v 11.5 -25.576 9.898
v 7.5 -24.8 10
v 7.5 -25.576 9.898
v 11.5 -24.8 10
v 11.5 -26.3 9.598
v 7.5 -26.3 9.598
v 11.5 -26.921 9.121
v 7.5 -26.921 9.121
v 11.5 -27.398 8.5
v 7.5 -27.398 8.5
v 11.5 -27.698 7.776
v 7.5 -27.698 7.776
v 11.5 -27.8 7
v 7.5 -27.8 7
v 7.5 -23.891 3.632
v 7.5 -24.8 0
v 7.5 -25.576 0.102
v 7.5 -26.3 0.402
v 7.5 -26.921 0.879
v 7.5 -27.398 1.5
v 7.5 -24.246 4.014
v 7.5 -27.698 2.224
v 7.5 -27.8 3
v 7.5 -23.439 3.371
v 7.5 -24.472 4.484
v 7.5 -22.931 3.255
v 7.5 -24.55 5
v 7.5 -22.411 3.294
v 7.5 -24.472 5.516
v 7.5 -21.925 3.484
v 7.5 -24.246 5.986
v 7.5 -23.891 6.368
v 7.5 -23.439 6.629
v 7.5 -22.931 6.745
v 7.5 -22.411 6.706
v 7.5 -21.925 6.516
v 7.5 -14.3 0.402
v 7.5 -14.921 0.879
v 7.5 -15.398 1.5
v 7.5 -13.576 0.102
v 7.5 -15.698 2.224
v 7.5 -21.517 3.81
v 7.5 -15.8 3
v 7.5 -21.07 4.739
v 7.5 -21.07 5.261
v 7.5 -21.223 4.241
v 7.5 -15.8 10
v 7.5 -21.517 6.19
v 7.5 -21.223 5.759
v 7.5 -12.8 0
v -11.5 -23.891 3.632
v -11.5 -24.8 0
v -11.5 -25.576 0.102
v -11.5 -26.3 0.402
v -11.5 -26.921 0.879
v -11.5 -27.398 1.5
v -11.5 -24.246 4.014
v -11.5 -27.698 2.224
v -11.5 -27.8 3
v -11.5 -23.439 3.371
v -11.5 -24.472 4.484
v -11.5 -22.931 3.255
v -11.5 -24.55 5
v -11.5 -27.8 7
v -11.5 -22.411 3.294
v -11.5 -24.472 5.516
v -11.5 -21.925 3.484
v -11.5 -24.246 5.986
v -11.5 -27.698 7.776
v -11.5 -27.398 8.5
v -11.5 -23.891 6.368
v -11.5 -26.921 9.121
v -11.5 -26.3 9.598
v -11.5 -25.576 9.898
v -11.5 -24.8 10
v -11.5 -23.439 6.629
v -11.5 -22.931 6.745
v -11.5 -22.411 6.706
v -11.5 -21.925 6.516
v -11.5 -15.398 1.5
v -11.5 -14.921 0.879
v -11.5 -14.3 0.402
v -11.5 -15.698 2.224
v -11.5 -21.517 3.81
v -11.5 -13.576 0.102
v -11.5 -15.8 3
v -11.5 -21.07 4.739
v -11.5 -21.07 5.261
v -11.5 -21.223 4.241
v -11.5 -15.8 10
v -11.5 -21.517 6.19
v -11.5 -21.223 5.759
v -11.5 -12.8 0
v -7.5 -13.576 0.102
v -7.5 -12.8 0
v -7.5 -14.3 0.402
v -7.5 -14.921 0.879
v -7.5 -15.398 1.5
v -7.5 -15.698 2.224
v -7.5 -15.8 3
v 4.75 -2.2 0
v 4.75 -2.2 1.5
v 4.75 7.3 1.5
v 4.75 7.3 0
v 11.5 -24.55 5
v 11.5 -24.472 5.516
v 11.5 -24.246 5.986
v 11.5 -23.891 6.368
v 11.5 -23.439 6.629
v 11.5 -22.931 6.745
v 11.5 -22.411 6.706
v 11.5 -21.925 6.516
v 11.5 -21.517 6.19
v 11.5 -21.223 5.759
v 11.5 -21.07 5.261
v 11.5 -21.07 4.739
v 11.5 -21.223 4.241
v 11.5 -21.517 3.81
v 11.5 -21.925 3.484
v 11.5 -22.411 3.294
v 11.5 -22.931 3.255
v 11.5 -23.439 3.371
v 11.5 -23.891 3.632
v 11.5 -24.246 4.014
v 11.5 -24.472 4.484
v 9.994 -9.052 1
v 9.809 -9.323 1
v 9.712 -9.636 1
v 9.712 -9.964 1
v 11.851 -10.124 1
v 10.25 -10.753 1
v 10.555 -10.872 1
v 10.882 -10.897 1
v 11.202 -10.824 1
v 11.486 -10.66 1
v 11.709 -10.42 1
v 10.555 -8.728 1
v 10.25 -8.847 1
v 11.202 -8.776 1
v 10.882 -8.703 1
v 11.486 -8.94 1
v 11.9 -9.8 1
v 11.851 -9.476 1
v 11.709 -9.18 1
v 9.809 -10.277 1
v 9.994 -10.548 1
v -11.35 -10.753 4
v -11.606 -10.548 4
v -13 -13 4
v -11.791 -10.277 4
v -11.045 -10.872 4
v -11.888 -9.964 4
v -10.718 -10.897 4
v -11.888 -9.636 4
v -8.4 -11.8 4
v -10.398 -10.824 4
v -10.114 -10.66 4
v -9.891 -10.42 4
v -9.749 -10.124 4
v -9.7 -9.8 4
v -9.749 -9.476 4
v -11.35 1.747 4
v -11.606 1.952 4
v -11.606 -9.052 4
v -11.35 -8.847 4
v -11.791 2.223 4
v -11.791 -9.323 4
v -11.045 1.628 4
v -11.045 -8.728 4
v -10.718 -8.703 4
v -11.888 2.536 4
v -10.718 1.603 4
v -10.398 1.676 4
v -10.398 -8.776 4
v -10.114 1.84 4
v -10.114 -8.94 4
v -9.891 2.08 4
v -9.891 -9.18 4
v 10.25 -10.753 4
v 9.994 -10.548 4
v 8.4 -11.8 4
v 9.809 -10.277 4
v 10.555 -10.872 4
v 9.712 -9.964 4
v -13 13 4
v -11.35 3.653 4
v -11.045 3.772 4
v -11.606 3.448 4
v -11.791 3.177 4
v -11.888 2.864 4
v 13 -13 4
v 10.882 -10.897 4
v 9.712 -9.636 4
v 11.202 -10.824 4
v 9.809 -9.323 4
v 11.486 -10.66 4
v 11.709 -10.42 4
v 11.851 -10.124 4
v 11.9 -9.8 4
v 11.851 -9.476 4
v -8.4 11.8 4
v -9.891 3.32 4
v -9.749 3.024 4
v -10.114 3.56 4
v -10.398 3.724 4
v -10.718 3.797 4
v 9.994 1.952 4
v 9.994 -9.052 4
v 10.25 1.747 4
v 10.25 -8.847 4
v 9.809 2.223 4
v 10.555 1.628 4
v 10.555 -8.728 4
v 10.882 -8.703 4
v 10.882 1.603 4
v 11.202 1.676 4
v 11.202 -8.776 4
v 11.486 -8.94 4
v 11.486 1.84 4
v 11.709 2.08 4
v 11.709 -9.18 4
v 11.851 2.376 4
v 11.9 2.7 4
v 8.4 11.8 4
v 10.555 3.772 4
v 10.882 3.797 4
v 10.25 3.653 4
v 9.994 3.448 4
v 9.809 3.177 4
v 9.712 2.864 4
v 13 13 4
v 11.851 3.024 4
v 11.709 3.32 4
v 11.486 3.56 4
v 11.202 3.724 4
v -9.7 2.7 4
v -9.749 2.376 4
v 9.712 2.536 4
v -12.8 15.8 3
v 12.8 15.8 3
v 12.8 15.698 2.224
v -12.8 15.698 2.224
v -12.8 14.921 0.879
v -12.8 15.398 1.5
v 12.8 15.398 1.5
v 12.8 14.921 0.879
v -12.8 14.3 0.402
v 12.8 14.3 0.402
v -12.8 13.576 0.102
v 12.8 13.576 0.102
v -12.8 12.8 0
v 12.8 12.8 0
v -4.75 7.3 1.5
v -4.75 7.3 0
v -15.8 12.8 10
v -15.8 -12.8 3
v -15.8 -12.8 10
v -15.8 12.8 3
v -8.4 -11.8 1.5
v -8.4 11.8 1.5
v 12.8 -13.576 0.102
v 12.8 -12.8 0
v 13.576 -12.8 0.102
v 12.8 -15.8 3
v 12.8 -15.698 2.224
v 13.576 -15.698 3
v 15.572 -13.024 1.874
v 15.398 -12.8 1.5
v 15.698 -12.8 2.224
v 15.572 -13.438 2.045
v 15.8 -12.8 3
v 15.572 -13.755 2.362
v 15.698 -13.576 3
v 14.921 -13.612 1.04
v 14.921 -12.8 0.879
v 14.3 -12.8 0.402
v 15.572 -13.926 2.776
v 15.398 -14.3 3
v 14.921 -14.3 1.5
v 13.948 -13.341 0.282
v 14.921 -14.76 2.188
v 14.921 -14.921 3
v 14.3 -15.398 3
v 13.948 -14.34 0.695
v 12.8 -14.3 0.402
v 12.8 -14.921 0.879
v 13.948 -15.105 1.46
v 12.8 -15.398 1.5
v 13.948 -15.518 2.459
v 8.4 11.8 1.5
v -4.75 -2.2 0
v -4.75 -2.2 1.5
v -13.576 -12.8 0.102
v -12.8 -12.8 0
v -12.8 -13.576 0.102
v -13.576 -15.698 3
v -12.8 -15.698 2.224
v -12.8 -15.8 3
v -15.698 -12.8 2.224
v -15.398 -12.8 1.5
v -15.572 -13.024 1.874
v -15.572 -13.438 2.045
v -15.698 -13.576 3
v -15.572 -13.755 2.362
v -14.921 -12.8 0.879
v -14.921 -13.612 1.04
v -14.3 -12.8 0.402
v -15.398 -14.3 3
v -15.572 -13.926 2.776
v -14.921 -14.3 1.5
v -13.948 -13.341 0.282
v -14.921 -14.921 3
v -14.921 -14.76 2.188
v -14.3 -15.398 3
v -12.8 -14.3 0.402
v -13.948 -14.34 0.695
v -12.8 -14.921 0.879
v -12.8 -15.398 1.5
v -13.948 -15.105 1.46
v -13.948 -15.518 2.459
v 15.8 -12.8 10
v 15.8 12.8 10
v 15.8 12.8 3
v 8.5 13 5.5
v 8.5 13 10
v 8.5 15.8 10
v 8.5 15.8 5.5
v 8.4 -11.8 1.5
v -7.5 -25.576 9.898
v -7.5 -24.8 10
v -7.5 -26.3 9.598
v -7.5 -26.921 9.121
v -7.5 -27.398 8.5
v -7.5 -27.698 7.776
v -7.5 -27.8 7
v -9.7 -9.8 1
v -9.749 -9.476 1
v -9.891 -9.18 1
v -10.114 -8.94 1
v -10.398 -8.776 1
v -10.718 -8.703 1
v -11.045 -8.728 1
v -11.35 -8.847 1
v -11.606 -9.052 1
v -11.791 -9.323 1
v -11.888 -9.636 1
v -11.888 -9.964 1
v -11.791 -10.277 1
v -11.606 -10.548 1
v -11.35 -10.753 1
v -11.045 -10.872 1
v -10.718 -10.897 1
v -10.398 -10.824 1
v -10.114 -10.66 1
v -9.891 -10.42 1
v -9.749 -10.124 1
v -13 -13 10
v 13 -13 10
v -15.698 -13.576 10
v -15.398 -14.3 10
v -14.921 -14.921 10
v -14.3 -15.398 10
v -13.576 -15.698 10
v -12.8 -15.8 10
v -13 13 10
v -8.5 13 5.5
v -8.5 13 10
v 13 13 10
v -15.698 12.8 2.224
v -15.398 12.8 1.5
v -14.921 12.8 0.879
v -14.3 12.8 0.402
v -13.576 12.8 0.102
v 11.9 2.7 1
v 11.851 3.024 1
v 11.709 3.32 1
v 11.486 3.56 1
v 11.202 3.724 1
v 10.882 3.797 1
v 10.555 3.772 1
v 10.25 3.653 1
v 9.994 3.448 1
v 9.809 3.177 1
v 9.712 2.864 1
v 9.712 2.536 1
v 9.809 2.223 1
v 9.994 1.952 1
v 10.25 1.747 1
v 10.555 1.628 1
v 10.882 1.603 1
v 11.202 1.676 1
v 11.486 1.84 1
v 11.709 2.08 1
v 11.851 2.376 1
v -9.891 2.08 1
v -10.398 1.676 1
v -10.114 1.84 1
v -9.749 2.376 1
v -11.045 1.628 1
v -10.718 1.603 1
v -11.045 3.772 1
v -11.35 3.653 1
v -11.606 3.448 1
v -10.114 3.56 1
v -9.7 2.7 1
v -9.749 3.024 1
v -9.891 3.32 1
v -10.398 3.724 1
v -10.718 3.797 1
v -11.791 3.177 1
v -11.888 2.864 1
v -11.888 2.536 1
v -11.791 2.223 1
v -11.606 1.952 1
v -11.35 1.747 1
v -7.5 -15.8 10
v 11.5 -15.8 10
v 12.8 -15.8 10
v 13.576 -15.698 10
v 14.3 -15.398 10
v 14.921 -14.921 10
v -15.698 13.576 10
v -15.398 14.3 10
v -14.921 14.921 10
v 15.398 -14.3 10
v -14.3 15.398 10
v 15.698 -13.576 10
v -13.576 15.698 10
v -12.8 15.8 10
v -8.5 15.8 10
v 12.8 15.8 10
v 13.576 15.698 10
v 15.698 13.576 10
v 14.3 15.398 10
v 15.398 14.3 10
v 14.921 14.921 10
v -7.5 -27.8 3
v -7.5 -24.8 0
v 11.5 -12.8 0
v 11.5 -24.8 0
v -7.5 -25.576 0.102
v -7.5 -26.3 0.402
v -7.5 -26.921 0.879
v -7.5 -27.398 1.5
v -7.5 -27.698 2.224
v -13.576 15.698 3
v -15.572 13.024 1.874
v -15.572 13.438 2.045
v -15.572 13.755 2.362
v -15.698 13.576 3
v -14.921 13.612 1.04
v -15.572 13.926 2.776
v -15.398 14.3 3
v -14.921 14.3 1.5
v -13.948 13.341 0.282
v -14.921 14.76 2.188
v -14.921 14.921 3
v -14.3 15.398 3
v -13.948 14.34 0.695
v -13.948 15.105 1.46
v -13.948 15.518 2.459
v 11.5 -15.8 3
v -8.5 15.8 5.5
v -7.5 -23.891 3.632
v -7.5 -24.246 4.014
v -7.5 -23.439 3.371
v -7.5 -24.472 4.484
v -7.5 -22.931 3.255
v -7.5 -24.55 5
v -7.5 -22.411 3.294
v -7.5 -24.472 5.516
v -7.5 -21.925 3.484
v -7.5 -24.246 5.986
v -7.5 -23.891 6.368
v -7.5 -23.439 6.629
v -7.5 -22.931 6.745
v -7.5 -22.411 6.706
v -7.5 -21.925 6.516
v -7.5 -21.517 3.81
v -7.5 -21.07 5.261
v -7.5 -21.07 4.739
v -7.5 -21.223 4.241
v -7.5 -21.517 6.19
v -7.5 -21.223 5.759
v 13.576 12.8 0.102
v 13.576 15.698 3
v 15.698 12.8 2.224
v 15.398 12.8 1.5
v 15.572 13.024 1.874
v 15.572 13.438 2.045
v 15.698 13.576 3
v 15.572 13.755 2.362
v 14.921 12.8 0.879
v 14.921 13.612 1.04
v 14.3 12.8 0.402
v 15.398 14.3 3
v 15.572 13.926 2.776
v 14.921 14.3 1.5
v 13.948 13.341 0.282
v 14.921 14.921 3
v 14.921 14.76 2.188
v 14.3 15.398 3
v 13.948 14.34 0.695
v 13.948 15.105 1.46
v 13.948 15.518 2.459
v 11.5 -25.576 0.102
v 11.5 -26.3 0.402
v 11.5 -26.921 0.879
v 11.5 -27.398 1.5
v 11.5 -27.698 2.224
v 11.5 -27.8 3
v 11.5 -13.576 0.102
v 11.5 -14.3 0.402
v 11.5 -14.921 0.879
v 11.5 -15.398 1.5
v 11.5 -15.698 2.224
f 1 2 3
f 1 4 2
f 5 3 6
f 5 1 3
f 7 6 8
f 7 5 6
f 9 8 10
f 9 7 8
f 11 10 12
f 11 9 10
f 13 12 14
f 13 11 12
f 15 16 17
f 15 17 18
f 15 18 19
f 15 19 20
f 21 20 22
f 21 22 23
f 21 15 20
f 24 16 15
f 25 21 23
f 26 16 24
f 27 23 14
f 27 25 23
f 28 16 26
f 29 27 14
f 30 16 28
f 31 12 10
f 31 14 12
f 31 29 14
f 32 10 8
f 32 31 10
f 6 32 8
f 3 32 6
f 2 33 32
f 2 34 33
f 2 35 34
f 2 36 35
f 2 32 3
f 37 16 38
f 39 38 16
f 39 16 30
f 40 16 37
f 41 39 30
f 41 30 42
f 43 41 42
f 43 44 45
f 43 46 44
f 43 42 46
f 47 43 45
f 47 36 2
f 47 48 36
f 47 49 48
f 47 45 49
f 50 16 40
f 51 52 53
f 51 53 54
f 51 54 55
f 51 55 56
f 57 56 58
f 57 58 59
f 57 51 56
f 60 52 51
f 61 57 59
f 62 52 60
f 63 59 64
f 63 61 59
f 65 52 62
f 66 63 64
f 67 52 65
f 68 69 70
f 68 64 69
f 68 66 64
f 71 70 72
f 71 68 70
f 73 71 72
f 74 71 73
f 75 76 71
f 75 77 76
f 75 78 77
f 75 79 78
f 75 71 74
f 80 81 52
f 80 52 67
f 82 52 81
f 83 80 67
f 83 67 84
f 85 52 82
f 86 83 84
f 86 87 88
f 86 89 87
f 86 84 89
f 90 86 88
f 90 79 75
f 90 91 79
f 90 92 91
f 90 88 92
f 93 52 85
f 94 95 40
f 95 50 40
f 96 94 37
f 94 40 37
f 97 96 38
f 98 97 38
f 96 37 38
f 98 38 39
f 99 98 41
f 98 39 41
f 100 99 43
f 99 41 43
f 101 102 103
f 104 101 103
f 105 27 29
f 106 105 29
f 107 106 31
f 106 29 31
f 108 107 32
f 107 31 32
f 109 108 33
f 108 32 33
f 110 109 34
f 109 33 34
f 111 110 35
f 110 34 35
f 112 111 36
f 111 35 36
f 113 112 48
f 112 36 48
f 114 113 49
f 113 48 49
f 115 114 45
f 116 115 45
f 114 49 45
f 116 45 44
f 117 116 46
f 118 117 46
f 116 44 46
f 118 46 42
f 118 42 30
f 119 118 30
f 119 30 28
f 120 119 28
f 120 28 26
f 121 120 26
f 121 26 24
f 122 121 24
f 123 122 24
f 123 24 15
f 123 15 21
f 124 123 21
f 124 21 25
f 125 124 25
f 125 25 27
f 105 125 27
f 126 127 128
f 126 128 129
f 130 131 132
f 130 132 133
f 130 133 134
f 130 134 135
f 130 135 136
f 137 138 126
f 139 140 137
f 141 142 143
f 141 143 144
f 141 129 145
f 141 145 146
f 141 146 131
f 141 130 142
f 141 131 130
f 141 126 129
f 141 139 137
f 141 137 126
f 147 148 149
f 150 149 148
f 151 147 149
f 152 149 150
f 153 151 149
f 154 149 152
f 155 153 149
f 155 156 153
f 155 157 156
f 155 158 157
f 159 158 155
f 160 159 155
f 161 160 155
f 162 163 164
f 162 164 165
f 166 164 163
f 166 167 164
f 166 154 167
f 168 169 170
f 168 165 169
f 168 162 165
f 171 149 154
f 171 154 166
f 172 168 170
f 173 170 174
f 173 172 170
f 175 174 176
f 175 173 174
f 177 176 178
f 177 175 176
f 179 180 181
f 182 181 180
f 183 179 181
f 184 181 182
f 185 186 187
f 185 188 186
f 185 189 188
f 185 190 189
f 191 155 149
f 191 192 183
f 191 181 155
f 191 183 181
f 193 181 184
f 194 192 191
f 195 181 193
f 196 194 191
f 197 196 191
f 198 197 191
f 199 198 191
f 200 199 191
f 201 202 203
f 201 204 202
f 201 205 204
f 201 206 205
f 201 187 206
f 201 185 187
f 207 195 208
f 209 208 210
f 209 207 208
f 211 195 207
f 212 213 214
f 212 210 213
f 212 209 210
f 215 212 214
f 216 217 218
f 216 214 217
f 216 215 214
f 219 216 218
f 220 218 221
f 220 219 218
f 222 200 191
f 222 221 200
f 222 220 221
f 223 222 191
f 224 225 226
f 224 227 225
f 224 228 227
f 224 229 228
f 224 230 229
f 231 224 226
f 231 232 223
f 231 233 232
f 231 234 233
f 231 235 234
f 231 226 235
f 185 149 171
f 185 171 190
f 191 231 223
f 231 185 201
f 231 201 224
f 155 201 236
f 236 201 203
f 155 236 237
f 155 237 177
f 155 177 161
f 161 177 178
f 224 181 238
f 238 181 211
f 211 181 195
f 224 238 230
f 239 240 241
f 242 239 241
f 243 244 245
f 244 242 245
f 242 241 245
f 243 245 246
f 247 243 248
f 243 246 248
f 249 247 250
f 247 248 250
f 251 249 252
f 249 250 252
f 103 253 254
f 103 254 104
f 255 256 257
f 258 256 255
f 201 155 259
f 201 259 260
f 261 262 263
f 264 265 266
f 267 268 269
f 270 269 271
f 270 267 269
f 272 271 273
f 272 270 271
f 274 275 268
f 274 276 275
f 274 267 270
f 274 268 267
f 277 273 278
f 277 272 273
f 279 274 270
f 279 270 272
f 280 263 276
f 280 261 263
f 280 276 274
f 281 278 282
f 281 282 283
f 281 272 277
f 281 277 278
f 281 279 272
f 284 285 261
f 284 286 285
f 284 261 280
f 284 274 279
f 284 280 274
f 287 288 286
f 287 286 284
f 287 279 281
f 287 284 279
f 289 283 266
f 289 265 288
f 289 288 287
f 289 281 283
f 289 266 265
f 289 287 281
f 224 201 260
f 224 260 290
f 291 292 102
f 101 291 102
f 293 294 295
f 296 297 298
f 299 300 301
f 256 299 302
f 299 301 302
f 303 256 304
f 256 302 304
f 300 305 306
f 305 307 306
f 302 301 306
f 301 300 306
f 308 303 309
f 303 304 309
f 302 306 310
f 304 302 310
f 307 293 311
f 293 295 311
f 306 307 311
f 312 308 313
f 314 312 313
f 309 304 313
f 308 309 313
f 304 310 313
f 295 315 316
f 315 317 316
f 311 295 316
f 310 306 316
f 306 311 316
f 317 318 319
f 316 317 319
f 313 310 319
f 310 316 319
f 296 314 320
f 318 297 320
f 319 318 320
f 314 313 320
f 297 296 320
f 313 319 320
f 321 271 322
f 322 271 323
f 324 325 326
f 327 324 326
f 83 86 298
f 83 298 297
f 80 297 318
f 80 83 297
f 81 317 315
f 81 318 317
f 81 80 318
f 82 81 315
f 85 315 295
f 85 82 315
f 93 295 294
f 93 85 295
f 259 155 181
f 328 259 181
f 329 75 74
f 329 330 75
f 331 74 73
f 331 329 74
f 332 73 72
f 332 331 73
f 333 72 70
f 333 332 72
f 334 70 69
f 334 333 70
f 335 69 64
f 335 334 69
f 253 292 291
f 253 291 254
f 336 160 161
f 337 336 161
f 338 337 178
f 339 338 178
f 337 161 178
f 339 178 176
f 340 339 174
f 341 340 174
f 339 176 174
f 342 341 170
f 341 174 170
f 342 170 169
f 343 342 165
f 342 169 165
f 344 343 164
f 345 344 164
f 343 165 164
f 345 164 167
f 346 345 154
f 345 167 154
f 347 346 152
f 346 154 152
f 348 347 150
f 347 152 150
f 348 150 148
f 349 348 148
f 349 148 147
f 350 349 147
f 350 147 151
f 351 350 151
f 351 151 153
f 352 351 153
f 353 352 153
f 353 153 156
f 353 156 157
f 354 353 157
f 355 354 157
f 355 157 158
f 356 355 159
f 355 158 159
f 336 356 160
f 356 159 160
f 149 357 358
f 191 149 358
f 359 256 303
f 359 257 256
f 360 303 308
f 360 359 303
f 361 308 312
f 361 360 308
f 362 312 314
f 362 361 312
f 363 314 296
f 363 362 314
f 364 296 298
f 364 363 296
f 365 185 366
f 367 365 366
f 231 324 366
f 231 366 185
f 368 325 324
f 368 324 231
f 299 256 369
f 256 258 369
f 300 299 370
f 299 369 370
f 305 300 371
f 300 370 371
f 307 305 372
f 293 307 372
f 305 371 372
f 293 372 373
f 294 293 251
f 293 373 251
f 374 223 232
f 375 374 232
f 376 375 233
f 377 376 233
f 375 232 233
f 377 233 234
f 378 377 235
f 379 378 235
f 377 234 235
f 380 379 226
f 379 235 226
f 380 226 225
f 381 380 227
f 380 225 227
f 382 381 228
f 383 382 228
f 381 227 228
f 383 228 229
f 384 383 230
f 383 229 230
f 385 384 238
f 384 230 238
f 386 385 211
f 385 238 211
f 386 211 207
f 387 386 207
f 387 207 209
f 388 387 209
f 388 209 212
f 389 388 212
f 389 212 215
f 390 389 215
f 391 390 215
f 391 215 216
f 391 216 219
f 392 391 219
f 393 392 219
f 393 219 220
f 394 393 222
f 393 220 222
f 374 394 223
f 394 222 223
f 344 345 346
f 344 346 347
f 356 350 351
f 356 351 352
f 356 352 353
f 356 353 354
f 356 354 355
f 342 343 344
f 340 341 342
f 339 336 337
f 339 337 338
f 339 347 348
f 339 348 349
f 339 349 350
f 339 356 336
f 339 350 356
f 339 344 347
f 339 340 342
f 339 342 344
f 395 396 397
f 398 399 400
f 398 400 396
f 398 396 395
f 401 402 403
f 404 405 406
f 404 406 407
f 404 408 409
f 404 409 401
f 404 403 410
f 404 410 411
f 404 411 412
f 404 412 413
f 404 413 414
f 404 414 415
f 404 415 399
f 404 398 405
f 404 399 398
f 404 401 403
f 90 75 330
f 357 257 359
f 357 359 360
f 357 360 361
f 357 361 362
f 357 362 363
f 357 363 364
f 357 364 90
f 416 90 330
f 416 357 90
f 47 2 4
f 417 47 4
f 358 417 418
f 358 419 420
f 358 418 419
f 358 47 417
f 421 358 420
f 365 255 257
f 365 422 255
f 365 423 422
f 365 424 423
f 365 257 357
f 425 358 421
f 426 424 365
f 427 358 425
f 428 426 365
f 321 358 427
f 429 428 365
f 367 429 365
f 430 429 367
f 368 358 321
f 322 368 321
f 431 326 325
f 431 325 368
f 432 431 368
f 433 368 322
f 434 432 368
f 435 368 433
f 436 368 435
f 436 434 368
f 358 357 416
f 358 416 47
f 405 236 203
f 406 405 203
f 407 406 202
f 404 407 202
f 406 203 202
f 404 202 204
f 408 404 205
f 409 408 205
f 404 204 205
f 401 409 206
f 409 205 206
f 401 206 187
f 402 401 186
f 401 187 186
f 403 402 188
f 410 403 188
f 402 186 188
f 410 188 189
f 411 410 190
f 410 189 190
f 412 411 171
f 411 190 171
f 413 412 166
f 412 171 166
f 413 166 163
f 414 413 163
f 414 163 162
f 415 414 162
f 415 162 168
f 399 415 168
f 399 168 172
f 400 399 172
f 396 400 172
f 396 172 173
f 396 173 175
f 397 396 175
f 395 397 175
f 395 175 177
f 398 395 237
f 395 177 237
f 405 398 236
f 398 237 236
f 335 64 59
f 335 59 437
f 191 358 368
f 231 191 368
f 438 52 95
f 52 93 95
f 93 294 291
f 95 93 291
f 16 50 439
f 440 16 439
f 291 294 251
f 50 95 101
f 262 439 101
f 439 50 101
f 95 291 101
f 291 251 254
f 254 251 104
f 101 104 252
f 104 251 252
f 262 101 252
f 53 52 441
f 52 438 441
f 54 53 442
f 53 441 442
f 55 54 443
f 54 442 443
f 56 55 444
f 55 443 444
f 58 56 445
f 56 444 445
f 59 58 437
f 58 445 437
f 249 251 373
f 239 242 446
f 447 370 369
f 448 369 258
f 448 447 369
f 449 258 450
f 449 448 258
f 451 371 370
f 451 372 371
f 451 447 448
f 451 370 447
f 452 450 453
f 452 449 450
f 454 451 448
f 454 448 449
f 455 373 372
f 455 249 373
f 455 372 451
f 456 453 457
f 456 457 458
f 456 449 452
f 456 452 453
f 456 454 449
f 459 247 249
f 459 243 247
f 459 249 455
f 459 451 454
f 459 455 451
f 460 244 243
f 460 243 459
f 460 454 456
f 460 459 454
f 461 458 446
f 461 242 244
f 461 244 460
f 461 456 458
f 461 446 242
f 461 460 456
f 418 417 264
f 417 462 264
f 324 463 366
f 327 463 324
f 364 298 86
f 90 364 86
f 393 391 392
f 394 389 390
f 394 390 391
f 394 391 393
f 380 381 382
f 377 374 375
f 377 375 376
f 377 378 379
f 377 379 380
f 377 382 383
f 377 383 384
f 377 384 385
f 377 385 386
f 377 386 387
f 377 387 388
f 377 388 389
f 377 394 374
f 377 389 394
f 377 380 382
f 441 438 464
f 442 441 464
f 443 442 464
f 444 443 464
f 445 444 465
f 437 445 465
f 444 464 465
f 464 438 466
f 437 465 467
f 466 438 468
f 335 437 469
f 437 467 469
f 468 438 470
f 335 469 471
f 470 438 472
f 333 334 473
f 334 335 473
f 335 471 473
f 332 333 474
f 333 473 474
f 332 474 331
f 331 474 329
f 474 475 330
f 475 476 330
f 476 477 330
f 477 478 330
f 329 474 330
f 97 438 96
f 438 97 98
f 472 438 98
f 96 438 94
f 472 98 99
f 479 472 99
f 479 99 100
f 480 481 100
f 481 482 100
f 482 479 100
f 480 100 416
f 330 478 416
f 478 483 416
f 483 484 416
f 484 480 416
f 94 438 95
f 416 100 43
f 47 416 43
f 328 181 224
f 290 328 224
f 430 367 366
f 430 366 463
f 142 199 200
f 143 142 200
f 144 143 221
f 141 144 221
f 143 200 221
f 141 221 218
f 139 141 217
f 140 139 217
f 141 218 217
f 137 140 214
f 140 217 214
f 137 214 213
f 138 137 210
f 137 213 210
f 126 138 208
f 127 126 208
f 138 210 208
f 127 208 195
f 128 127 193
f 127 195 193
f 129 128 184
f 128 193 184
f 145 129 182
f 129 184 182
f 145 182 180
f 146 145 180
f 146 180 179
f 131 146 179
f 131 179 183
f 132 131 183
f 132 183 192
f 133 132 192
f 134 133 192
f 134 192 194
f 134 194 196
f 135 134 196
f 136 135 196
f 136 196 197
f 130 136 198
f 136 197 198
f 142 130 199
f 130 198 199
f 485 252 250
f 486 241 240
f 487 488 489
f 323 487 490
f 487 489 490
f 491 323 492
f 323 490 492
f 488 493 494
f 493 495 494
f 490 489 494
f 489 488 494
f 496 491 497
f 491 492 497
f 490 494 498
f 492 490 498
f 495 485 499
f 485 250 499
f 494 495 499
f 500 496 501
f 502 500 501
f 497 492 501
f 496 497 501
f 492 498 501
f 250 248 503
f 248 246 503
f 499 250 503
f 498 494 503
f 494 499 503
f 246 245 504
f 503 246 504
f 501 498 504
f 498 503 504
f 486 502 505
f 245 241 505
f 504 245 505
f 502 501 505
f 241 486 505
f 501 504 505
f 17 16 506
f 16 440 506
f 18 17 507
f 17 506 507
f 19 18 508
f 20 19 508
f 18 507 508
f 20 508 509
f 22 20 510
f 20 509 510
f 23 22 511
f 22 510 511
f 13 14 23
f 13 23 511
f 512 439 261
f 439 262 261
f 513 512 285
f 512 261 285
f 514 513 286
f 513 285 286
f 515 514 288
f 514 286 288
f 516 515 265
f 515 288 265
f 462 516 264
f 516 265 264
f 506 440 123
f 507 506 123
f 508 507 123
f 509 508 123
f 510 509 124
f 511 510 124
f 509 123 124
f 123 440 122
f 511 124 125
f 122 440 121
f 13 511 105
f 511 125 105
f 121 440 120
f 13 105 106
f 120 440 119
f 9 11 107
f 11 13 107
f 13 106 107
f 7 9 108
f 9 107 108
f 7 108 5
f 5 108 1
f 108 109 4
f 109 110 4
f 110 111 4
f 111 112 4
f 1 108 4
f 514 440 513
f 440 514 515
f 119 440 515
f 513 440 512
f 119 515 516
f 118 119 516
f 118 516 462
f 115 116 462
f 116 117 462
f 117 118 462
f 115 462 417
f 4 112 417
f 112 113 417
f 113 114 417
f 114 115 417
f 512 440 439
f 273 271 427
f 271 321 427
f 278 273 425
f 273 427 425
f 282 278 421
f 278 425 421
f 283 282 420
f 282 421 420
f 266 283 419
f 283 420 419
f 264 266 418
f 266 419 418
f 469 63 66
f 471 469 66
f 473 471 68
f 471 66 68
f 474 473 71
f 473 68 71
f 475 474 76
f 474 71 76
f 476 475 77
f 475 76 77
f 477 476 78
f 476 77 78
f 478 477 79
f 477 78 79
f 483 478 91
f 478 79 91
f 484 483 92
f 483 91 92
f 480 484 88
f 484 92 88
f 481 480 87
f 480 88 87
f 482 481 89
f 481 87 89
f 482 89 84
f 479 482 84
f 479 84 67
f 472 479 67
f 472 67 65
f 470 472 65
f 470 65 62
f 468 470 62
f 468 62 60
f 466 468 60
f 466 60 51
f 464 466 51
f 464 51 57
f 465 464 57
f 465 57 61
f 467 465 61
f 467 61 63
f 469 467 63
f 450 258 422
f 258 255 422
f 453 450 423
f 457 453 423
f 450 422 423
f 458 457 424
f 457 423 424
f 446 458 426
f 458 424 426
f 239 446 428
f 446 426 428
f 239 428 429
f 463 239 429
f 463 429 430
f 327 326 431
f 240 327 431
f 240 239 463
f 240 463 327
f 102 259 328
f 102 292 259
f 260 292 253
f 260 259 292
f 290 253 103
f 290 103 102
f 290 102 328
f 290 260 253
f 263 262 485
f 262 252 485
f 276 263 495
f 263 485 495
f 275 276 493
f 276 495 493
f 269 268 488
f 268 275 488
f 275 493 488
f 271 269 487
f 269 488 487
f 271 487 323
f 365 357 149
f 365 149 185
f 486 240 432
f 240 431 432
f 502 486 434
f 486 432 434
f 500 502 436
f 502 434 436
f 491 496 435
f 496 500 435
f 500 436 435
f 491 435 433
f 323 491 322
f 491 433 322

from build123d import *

# Parameters (mm, degrees)
SKETCH2_W           = 31.6
SKETCH2_H           = 31.6
BOSS_EXTRUDE1_DEPTH = 10
SKETCH13_W          = 4
SKETCH13_H          = 10
BOSS_EXTRUDE2_DEPTH = 12
SKETCH14_R          = 1.75
CUT_EXTRUDE5_DEPTH  = 30
SKETCH9_W           = 25.999998474
SKETCH9_H           = 25.999998474
CUT_EXTRUDE1_DEPTH  = 6
SKETCH10_W          = 16.8
SKETCH10_H          = 23.599998474
CUT_EXTRUDE2_DEPTH  = 2.5
SKETCH11_W          = 9.5
SKETCH11_H          = 9.5
CUT_EXTRUDE3_DEPTH  = 2.5
SKETCH12_R          = 1.1
CUT_EXTRUDE4_DEPTH  = 3
FILLET1_R           = 3
SKETCH15_W          = 17
SKETCH15_H          = 2.800000763
CUT_EXTRUDE6_DEPTH  = 4.5


with BuildPart() as part:
    # Sketch2 → Boss-Extrude1 (new body)
    with BuildSketch(Plane.XY):
        Rectangle(SKETCH2_W, SKETCH2_H)
    extrude(amount=BOSS_EXTRUDE1_DEPTH)

    # Sketch13 → Boss-Extrude2 (add)
    with BuildSketch(Plane.XZ.offset(15.8)):
        with Locations((-9.5, 5)):
            Rectangle(SKETCH13_W, SKETCH13_H)
        with Locations((9.5, 5)):
            Rectangle(SKETCH13_W, SKETCH13_H)
    extrude(amount=BOSS_EXTRUDE2_DEPTH)

    # Sketch14 → Cut-Extrude5 (cut)
    with BuildSketch(Plane.ZY.offset(11.5)):
        with Locations(Location((5, -22.8, 0), (0, 0, 270))):
            Circle(SKETCH14_R)
    extrude(amount=-CUT_EXTRUDE5_DEPTH, mode=Mode.SUBTRACT)

    # Sketch9 → Cut-Extrude1 (cut)
    with BuildSketch(Plane.XY.offset(10)):
        Rectangle(SKETCH9_W, SKETCH9_H)
    extrude(amount=-CUT_EXTRUDE1_DEPTH, mode=Mode.SUBTRACT)

    # Sketch10 → Cut-Extrude2 (cut)
    with BuildSketch(Plane.XY.offset(4)):
        Rectangle(SKETCH10_W, SKETCH10_H)
    extrude(amount=-CUT_EXTRUDE2_DEPTH, mode=Mode.SUBTRACT)

    # Sketch11 → Cut-Extrude3 (cut)
    with BuildSketch(Plane.XY.offset(1.5)):
        with Locations((0, 2.549999952)):
            Rectangle(SKETCH11_W, SKETCH11_H)
    extrude(amount=-CUT_EXTRUDE3_DEPTH, mode=Mode.SUBTRACT)

    # Sketch12 → Cut-Extrude4 (cut)
    with BuildSketch(Plane.XY.offset(4)):
        with Locations((-10.800000191, 2.700000048)):
            Circle(SKETCH12_R)
        with Locations((10.800000191, 2.700000048)):
            Circle(SKETCH12_R)
        with Locations((10.800000191, -9.800000191)):
            Circle(SKETCH12_R)
        with Locations((-10.800000191, -9.800000191)):
            Circle(SKETCH12_R)
    extrude(amount=-CUT_EXTRUDE4_DEPTH, mode=Mode.SUBTRACT)

    # Fillet1
    fillet1_edges = [part.edges().sort_by_distance(p)[0] for p in [
        (0, -15.8, 0),
        (-9.5, -27.8, 0),
        (-9.5, -27.8, 10),
        (13.65, -15.8, 0),
        (9.5, -27.8, 0),
        (9.5, -27.8, 10),
        (0, 15.8, 0),
        (15.8, 0, 0),
        (-13.65, -15.8, 0),
        (-15.8, 0, 0),
        (-15.8, 15.8, 5),
        (15.8, 15.8, 5),
        (15.8, -15.8, 5),
        (-15.8, -15.8, 5),
    ]]
    fillet(fillet1_edges, radius=FILLET1_R)

    # Sketch15 → Cut-Extrude6 (cut)
    with BuildSketch(Plane.XY.offset(10)):
        with Locations((0, 14.399999619)):
            Rectangle(SKETCH15_W, SKETCH15_H)
    extrude(amount=-CUT_EXTRUDE6_DEPTH, mode=Mode.SUBTRACT)


solid = part.part
